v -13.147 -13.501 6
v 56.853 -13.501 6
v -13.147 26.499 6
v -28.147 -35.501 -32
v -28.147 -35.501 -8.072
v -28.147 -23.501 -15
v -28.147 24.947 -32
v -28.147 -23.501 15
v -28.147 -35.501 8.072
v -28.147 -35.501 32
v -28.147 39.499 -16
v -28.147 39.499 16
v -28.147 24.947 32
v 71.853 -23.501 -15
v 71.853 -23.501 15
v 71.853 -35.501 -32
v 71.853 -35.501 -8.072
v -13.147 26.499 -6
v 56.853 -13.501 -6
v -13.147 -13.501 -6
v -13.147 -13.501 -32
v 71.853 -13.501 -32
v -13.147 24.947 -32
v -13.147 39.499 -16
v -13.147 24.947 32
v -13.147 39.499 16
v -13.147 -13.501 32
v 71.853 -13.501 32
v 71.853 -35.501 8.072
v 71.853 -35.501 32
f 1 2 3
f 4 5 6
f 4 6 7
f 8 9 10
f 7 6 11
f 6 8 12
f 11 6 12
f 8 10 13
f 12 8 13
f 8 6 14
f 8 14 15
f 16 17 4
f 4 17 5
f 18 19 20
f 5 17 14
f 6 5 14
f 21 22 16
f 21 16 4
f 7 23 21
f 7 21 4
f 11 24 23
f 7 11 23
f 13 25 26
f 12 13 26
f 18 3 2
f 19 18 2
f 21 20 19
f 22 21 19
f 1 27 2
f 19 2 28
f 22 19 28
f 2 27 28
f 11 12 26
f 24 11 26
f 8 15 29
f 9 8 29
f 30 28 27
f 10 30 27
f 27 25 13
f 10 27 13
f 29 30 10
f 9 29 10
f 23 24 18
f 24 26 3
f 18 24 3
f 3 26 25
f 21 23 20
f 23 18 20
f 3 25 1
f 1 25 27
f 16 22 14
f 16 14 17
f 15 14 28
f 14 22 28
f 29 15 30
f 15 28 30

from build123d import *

# Parameters (mm, degrees)
BOSS_EXTRUDE2_DEPTH = 32
CUT_EXTRUDE2_DEPTH  = 21
CUT_EXTRUDE3_DEPTH  = 21
CUT_EXTRUDE4_DEPTH  = 5
CUT_EXTRUDE5_DEPTH  = 5
CUT_EXTRUDE6_REACH  = 17
CUT_EXTRUDE7_REACH  = 102


with BuildPart() as part:
    # Sketch1 → Boss-Extrude2 (new body, symmetric)
    with BuildSketch(Plane.XY):
        Polygon((-13.146933892, 26.49867374), (56.853066108, -13.50132626), (-13.146933892, -13.50132626), align=None)
        Polygon((-13.146933892, 26.49867374), (-13.146933892, -13.50132626), (56.853066108, -13.50132626), (71.853066108, -13.50132626), (71.853066108, -35.50132626), (-28.146933892, -35.50132626), (-28.146933892, 39.49867374), (-13.146933892, 39.49867374), align=None)
    extrude(amount=BOSS_EXTRUDE2_DEPTH, both=True)

    # Sketch3 → Cut-Extrude2 (cut)
    with BuildSketch(Plane.XY.offset(32)):
        Polygon((-13.146933892, 26.49867374), (-13.146933892, -13.50132626), (56.853066108, -13.50132626), align=None)
    extrude(amount=-CUT_EXTRUDE2_DEPTH, mode=Mode.SUBTRACT)

    # Sketch4 → Cut-Extrude3 (cut)
    with BuildSketch(Plane(origin=(0, 0, -32), x_dir=(-1, 0, 0), z_dir=(0, 0, -1))):
        Polygon((13.146933892, 26.49867374), (13.146933892, -13.50132626), (-56.853066108, -13.50132626), align=None)
    extrude(amount=-CUT_EXTRUDE3_DEPTH, mode=Mode.SUBTRACT)

    # Sketch8 → Cut-Extrude4 (cut)
    with BuildSketch(Plane.XY.offset(11)):
        Polygon((-13.146933892, 26.49867374), (56.853066108, -13.50132626), (-13.146933892, -13.50132626), align=None)
    extrude(amount=-CUT_EXTRUDE4_DEPTH, mode=Mode.SUBTRACT)

    # Sketch9 → Cut-Extrude5 (cut)
    with BuildSketch(Plane(origin=(0, 0, -11), x_dir=(-1, 0, 0), z_dir=(0, 0, -1))):
        Polygon((13.146933892, 26.49867374), (-56.853066108, -13.50132626), (13.146933892, -13.50132626), align=None)
    extrude(amount=-CUT_EXTRUDE5_DEPTH, mode=Mode.SUBTRACT)

    # Sketch10 → Cut-Extrude6 (cut, up to next)
    with BuildSketch(Plane(origin=(-13.146933892, 0, 0), x_dir=(0, 0, -1), z_dir=(1, 0, 0)), mode=Mode.PRIVATE) as cut_extrude6_sk1:
        Polygon((-16, 39.49867374), (-32, 39.49867374), (-32, 24.946500862), align=None)
    cut_extrude6_tool1 = extrude(cut_extrude6_sk1.sketch, amount=-CUT_EXTRUDE6_REACH, mode=Mode.PRIVATE) & part.part
    add(cut_extrude6_tool1.solids().sort_by_distance((-13.146934, 34.647949, 26.666667))[0], mode=Mode.SUBTRACT)
    # Sketch10 → Cut-Extrude6 (cut, up to next)
    with BuildSketch(Plane(origin=(-13.146933892, 0, 0), x_dir=(0, 0, -1), z_dir=(1, 0, 0)), mode=Mode.PRIVATE) as cut_extrude6_sk2:
        Polygon((32, 39.49867374), (16, 39.49867374), (32, 24.946500862), align=None)
    cut_extrude6_tool2 = extrude(cut_extrude6_sk2.sketch, amount=-CUT_EXTRUDE6_REACH, mode=Mode.PRIVATE) & part.part
    add(cut_extrude6_tool2.solids().sort_by_distance((-13.146934, 34.647949, -26.666667))[0], mode=Mode.SUBTRACT)

    # Sketch11 → Cut-Extrude7 (cut, up to next)
    with BuildSketch(Plane(origin=(71.853066108, 0, 0), x_dir=(0, 0, -1), z_dir=(1, 0, 0)), mode=Mode.PRIVATE) as cut_extrude7_sk1:
        Polygon((-8.07179677, -35.50132626), (8.07179677, -35.50132626), (15, -23.50132626), (-15, -23.50132626), align=None)
    cut_extrude7_tool1 = extrude(cut_extrude7_sk1.sketch, amount=-CUT_EXTRUDE7_REACH, mode=Mode.PRIVATE) & part.part
    add(cut_extrude7_tool1.solids().sort_by_distance((71.853066, -28.900749, 0))[0], mode=Mode.SUBTRACT)


solid = part.part
